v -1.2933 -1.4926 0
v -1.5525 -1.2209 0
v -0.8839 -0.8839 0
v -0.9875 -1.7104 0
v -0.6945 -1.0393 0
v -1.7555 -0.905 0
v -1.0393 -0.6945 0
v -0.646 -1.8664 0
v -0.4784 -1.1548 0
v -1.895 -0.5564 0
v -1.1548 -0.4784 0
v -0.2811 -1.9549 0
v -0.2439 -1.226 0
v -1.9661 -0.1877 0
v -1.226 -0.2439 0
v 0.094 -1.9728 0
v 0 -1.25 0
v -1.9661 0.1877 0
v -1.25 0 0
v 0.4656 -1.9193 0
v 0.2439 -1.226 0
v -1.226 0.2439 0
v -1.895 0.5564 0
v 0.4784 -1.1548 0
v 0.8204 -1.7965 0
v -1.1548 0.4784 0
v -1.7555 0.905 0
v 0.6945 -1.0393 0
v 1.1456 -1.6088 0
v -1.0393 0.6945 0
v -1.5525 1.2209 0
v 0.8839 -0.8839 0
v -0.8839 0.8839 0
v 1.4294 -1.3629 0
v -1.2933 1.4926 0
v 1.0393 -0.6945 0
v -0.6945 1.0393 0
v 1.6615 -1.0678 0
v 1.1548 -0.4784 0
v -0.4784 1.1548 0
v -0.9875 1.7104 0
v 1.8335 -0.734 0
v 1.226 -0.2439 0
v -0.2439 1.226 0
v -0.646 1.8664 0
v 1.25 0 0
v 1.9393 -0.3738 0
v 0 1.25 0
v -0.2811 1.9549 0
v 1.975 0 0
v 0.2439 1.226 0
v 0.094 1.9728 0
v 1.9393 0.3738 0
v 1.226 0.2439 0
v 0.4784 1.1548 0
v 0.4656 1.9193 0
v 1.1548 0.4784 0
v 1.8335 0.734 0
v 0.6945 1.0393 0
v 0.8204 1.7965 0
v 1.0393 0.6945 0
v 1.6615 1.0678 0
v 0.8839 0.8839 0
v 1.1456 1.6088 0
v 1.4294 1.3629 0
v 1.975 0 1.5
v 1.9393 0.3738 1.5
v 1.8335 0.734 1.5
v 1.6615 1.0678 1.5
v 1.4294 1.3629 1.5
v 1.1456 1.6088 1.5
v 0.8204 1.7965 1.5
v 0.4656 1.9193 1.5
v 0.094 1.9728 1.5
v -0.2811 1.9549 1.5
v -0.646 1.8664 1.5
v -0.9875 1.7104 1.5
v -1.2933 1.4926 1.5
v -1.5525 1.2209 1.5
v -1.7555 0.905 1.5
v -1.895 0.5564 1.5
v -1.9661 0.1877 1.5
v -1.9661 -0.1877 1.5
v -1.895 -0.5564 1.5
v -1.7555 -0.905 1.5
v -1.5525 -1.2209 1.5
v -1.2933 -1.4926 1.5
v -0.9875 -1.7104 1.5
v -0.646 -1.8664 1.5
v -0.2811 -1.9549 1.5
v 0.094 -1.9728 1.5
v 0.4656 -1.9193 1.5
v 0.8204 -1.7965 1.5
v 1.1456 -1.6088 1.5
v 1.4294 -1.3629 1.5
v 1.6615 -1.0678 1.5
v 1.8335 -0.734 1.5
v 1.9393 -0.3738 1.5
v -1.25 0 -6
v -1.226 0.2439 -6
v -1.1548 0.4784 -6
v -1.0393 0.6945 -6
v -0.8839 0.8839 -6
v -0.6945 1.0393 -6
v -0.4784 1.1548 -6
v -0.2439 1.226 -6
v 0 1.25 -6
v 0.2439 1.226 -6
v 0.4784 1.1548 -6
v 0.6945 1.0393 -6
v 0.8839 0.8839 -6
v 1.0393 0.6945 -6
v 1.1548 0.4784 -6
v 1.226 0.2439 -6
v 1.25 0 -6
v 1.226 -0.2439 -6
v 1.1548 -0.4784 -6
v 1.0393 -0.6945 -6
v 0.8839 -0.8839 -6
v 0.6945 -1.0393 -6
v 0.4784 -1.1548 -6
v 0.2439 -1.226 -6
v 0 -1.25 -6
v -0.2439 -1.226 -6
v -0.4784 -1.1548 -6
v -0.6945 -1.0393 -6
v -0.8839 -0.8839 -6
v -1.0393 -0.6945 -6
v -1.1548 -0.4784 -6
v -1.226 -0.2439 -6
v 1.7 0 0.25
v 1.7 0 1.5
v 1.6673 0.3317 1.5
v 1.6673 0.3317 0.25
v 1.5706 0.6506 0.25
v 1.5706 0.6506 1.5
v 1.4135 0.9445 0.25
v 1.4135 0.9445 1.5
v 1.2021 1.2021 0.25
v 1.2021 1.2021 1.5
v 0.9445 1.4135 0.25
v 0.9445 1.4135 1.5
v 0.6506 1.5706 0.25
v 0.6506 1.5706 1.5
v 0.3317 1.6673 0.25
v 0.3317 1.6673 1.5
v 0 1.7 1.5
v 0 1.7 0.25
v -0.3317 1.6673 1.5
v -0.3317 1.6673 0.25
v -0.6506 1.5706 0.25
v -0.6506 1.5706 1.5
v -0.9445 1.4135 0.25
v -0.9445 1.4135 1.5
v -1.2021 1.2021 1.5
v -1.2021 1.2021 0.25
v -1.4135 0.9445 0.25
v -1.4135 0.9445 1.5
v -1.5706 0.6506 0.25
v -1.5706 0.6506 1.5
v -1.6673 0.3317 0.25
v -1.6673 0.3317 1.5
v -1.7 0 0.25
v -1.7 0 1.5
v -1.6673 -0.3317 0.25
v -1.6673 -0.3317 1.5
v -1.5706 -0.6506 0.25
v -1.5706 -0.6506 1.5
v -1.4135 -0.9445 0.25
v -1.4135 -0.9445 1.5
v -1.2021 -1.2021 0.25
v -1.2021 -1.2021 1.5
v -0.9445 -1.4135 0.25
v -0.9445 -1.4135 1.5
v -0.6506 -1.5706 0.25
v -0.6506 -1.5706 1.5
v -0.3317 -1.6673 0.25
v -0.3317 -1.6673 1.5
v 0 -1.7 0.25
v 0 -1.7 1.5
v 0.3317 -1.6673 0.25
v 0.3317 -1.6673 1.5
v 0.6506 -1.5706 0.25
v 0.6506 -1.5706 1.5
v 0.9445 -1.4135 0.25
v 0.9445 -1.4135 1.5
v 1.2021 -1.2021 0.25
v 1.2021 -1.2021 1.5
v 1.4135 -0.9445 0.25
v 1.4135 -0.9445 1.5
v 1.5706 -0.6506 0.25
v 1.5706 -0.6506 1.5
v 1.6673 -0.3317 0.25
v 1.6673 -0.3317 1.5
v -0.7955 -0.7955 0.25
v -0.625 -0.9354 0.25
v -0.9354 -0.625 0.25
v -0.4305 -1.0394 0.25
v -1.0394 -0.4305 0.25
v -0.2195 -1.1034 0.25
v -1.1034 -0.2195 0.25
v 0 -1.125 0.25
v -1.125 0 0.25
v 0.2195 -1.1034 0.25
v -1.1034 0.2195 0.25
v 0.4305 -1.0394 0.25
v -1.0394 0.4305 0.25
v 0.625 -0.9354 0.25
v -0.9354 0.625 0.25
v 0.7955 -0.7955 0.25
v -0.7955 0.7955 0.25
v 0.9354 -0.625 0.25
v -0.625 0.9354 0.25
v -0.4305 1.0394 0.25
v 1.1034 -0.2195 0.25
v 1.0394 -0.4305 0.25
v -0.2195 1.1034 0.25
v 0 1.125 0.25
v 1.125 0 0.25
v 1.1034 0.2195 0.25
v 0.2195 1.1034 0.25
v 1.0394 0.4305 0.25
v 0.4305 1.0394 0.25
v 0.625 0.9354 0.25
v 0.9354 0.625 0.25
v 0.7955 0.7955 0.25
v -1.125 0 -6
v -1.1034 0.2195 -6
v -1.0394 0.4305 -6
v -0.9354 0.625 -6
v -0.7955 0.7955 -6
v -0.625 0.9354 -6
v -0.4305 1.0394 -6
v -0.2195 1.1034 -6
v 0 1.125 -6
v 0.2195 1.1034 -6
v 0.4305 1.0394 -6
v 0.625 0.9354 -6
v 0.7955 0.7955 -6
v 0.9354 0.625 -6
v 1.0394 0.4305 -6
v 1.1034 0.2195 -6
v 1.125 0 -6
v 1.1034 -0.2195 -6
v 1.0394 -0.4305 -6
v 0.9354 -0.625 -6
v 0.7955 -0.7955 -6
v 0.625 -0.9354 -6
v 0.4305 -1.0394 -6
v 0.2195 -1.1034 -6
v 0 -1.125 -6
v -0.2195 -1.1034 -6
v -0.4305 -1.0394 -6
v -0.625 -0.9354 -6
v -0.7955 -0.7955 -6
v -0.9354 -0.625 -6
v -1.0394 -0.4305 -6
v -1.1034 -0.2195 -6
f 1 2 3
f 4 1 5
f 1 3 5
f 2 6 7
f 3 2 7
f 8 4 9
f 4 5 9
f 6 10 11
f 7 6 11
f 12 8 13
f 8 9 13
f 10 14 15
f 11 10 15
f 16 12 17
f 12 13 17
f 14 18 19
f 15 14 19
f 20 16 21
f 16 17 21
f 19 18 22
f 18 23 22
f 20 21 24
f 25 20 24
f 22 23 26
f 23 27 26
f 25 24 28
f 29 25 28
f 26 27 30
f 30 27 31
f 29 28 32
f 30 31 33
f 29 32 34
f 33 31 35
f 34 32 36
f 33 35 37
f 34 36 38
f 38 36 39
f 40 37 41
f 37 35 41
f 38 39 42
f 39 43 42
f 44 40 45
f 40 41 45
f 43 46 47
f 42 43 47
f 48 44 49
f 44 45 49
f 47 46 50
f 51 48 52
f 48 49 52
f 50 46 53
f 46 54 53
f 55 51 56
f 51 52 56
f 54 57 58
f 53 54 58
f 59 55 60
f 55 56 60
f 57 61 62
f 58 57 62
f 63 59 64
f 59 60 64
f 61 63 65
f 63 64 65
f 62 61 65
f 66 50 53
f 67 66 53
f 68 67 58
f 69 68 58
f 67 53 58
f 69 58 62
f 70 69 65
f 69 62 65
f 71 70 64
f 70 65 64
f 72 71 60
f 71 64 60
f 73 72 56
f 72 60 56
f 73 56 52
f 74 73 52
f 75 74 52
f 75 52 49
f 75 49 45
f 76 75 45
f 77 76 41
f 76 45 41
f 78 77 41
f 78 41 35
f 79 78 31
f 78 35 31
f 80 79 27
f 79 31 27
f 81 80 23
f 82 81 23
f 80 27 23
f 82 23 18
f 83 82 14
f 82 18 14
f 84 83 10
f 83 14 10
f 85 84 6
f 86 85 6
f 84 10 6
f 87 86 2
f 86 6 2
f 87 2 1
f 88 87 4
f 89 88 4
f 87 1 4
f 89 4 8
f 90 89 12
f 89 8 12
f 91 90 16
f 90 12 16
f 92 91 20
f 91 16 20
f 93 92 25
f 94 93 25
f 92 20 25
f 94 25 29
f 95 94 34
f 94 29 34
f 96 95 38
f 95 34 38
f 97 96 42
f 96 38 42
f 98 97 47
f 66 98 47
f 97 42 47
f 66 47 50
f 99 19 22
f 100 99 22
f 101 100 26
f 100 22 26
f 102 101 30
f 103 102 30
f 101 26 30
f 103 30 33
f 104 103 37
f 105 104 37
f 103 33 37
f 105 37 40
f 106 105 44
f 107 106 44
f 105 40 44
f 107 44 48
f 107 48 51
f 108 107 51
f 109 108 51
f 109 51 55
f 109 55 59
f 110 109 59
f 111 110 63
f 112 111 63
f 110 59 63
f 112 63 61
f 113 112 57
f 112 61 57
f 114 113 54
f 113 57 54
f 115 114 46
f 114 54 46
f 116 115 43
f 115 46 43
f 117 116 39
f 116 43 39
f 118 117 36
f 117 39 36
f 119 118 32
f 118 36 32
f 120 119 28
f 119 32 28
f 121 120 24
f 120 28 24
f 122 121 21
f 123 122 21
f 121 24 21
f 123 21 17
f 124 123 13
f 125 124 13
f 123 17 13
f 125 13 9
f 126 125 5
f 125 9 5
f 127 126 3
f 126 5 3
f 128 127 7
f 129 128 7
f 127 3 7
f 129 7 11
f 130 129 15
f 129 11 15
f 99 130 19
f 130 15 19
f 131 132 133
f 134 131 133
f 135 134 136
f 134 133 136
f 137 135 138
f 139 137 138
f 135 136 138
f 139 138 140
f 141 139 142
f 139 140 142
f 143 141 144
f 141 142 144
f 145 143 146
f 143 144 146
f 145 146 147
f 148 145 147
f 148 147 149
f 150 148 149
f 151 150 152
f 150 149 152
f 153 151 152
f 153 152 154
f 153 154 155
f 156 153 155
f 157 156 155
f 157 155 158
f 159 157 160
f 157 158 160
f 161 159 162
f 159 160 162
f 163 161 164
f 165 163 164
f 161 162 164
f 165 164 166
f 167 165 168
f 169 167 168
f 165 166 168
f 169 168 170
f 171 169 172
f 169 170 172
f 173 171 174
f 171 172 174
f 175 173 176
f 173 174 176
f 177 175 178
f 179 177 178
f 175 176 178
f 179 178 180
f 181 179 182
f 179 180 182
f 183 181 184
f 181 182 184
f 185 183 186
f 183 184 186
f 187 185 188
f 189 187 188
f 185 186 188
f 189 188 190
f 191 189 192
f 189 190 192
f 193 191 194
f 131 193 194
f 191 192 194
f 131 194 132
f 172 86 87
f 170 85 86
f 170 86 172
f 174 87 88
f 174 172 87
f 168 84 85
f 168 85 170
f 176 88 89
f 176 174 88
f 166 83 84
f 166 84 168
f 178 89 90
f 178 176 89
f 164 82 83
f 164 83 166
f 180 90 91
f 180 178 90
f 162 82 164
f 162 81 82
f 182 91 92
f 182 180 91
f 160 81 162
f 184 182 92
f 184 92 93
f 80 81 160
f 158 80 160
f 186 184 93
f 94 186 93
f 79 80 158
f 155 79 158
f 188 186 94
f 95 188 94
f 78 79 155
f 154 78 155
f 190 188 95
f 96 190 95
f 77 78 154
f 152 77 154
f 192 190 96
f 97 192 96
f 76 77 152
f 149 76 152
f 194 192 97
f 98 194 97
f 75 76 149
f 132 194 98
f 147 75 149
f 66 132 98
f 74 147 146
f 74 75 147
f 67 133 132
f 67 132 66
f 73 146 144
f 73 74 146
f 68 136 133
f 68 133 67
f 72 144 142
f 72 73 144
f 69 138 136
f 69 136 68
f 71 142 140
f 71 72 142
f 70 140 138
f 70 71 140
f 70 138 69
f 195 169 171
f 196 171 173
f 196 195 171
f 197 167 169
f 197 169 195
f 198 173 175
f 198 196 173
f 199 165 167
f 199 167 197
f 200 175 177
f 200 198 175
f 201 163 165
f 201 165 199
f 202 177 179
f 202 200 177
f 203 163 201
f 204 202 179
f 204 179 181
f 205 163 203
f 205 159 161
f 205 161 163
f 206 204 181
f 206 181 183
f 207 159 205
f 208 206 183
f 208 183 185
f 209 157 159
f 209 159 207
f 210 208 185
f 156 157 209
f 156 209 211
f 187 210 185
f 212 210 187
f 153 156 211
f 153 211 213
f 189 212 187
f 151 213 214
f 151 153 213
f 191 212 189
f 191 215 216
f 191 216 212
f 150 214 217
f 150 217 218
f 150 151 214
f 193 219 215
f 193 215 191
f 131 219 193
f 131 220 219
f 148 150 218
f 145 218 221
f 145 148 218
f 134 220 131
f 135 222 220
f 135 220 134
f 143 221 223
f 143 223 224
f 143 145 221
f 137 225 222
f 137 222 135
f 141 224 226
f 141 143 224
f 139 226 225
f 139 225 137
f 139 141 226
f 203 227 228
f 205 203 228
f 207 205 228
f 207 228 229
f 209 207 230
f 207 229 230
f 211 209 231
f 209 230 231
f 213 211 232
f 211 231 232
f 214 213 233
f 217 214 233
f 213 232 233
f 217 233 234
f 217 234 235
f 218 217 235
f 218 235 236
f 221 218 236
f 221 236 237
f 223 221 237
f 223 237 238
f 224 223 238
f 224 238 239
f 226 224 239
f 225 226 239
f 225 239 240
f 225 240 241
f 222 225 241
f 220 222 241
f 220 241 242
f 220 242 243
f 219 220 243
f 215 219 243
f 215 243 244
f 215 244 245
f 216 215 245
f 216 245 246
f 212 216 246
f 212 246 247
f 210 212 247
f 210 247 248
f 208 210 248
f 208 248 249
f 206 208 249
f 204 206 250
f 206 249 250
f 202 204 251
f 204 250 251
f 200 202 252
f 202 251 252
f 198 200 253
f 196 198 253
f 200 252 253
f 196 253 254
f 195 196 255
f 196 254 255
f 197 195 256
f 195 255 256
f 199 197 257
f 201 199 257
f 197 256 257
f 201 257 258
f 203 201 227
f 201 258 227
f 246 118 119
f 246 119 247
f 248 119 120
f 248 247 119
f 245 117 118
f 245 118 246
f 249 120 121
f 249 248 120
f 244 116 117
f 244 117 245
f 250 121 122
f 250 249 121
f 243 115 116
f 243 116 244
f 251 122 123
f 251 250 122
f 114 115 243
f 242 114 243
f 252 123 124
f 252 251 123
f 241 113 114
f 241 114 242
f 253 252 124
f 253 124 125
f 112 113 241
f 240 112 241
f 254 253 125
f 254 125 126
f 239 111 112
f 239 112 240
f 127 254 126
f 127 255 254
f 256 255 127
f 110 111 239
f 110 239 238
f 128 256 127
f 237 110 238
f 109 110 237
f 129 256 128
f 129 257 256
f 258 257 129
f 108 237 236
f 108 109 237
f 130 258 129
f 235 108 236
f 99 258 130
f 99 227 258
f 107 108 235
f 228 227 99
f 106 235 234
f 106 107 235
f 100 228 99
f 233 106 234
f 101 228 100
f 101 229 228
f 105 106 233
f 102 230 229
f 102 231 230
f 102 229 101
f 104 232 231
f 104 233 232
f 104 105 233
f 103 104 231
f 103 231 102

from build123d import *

# Parameters (mm, degrees)
ESQUISSE1_R             = 1.975
BOSS_EXTRU_1_DEPTH      = 1.5
ESQUISSE2_R             = 1.25
BOSS_EXTRU_2_DEPTH      = 6
ESQUISSE3_R             = 1.7
ENL_V_MAT_EXTRU_2_DEPTH = 1.25
ESQUISSE4_R             = 1.125
ENL_V_MAT_EXTRU_4_DEPTH = 51.25


with BuildPart() as part:
    # Esquisse1 → Boss.-Extru.1 (new body)
    with BuildSketch(Plane.XY):
        Circle(ESQUISSE1_R)
    extrude(amount=BOSS_EXTRU_1_DEPTH)

    # Esquisse2 → Boss.-Extru.2 (add)
    with BuildSketch(Plane(origin=(0, 0, 0), x_dir=(-1, 0, 0), z_dir=(0, 0, -1))):
        Circle(ESQUISSE2_R)
    extrude(amount=BOSS_EXTRU_2_DEPTH)

    # Esquisse3 → Enlèv. mat.-Extru.2 (cut)
    with BuildSketch(Plane.XY.offset(1.5)):
        Circle(ESQUISSE3_R)
    extrude(amount=-ENL_V_MAT_EXTRU_2_DEPTH, mode=Mode.SUBTRACT)

    # Esquisse4 → Enlèv. mat.-Extru.4 (cut)
    with BuildSketch(Plane(origin=(0, 0, -6), x_dir=(-1, 0, 0), z_dir=(0, 0, -1))):
        Circle(ESQUISSE4_R)
    extrude(amount=-ENL_V_MAT_EXTRU_4_DEPTH, mode=Mode.SUBTRACT)


solid = part.part
